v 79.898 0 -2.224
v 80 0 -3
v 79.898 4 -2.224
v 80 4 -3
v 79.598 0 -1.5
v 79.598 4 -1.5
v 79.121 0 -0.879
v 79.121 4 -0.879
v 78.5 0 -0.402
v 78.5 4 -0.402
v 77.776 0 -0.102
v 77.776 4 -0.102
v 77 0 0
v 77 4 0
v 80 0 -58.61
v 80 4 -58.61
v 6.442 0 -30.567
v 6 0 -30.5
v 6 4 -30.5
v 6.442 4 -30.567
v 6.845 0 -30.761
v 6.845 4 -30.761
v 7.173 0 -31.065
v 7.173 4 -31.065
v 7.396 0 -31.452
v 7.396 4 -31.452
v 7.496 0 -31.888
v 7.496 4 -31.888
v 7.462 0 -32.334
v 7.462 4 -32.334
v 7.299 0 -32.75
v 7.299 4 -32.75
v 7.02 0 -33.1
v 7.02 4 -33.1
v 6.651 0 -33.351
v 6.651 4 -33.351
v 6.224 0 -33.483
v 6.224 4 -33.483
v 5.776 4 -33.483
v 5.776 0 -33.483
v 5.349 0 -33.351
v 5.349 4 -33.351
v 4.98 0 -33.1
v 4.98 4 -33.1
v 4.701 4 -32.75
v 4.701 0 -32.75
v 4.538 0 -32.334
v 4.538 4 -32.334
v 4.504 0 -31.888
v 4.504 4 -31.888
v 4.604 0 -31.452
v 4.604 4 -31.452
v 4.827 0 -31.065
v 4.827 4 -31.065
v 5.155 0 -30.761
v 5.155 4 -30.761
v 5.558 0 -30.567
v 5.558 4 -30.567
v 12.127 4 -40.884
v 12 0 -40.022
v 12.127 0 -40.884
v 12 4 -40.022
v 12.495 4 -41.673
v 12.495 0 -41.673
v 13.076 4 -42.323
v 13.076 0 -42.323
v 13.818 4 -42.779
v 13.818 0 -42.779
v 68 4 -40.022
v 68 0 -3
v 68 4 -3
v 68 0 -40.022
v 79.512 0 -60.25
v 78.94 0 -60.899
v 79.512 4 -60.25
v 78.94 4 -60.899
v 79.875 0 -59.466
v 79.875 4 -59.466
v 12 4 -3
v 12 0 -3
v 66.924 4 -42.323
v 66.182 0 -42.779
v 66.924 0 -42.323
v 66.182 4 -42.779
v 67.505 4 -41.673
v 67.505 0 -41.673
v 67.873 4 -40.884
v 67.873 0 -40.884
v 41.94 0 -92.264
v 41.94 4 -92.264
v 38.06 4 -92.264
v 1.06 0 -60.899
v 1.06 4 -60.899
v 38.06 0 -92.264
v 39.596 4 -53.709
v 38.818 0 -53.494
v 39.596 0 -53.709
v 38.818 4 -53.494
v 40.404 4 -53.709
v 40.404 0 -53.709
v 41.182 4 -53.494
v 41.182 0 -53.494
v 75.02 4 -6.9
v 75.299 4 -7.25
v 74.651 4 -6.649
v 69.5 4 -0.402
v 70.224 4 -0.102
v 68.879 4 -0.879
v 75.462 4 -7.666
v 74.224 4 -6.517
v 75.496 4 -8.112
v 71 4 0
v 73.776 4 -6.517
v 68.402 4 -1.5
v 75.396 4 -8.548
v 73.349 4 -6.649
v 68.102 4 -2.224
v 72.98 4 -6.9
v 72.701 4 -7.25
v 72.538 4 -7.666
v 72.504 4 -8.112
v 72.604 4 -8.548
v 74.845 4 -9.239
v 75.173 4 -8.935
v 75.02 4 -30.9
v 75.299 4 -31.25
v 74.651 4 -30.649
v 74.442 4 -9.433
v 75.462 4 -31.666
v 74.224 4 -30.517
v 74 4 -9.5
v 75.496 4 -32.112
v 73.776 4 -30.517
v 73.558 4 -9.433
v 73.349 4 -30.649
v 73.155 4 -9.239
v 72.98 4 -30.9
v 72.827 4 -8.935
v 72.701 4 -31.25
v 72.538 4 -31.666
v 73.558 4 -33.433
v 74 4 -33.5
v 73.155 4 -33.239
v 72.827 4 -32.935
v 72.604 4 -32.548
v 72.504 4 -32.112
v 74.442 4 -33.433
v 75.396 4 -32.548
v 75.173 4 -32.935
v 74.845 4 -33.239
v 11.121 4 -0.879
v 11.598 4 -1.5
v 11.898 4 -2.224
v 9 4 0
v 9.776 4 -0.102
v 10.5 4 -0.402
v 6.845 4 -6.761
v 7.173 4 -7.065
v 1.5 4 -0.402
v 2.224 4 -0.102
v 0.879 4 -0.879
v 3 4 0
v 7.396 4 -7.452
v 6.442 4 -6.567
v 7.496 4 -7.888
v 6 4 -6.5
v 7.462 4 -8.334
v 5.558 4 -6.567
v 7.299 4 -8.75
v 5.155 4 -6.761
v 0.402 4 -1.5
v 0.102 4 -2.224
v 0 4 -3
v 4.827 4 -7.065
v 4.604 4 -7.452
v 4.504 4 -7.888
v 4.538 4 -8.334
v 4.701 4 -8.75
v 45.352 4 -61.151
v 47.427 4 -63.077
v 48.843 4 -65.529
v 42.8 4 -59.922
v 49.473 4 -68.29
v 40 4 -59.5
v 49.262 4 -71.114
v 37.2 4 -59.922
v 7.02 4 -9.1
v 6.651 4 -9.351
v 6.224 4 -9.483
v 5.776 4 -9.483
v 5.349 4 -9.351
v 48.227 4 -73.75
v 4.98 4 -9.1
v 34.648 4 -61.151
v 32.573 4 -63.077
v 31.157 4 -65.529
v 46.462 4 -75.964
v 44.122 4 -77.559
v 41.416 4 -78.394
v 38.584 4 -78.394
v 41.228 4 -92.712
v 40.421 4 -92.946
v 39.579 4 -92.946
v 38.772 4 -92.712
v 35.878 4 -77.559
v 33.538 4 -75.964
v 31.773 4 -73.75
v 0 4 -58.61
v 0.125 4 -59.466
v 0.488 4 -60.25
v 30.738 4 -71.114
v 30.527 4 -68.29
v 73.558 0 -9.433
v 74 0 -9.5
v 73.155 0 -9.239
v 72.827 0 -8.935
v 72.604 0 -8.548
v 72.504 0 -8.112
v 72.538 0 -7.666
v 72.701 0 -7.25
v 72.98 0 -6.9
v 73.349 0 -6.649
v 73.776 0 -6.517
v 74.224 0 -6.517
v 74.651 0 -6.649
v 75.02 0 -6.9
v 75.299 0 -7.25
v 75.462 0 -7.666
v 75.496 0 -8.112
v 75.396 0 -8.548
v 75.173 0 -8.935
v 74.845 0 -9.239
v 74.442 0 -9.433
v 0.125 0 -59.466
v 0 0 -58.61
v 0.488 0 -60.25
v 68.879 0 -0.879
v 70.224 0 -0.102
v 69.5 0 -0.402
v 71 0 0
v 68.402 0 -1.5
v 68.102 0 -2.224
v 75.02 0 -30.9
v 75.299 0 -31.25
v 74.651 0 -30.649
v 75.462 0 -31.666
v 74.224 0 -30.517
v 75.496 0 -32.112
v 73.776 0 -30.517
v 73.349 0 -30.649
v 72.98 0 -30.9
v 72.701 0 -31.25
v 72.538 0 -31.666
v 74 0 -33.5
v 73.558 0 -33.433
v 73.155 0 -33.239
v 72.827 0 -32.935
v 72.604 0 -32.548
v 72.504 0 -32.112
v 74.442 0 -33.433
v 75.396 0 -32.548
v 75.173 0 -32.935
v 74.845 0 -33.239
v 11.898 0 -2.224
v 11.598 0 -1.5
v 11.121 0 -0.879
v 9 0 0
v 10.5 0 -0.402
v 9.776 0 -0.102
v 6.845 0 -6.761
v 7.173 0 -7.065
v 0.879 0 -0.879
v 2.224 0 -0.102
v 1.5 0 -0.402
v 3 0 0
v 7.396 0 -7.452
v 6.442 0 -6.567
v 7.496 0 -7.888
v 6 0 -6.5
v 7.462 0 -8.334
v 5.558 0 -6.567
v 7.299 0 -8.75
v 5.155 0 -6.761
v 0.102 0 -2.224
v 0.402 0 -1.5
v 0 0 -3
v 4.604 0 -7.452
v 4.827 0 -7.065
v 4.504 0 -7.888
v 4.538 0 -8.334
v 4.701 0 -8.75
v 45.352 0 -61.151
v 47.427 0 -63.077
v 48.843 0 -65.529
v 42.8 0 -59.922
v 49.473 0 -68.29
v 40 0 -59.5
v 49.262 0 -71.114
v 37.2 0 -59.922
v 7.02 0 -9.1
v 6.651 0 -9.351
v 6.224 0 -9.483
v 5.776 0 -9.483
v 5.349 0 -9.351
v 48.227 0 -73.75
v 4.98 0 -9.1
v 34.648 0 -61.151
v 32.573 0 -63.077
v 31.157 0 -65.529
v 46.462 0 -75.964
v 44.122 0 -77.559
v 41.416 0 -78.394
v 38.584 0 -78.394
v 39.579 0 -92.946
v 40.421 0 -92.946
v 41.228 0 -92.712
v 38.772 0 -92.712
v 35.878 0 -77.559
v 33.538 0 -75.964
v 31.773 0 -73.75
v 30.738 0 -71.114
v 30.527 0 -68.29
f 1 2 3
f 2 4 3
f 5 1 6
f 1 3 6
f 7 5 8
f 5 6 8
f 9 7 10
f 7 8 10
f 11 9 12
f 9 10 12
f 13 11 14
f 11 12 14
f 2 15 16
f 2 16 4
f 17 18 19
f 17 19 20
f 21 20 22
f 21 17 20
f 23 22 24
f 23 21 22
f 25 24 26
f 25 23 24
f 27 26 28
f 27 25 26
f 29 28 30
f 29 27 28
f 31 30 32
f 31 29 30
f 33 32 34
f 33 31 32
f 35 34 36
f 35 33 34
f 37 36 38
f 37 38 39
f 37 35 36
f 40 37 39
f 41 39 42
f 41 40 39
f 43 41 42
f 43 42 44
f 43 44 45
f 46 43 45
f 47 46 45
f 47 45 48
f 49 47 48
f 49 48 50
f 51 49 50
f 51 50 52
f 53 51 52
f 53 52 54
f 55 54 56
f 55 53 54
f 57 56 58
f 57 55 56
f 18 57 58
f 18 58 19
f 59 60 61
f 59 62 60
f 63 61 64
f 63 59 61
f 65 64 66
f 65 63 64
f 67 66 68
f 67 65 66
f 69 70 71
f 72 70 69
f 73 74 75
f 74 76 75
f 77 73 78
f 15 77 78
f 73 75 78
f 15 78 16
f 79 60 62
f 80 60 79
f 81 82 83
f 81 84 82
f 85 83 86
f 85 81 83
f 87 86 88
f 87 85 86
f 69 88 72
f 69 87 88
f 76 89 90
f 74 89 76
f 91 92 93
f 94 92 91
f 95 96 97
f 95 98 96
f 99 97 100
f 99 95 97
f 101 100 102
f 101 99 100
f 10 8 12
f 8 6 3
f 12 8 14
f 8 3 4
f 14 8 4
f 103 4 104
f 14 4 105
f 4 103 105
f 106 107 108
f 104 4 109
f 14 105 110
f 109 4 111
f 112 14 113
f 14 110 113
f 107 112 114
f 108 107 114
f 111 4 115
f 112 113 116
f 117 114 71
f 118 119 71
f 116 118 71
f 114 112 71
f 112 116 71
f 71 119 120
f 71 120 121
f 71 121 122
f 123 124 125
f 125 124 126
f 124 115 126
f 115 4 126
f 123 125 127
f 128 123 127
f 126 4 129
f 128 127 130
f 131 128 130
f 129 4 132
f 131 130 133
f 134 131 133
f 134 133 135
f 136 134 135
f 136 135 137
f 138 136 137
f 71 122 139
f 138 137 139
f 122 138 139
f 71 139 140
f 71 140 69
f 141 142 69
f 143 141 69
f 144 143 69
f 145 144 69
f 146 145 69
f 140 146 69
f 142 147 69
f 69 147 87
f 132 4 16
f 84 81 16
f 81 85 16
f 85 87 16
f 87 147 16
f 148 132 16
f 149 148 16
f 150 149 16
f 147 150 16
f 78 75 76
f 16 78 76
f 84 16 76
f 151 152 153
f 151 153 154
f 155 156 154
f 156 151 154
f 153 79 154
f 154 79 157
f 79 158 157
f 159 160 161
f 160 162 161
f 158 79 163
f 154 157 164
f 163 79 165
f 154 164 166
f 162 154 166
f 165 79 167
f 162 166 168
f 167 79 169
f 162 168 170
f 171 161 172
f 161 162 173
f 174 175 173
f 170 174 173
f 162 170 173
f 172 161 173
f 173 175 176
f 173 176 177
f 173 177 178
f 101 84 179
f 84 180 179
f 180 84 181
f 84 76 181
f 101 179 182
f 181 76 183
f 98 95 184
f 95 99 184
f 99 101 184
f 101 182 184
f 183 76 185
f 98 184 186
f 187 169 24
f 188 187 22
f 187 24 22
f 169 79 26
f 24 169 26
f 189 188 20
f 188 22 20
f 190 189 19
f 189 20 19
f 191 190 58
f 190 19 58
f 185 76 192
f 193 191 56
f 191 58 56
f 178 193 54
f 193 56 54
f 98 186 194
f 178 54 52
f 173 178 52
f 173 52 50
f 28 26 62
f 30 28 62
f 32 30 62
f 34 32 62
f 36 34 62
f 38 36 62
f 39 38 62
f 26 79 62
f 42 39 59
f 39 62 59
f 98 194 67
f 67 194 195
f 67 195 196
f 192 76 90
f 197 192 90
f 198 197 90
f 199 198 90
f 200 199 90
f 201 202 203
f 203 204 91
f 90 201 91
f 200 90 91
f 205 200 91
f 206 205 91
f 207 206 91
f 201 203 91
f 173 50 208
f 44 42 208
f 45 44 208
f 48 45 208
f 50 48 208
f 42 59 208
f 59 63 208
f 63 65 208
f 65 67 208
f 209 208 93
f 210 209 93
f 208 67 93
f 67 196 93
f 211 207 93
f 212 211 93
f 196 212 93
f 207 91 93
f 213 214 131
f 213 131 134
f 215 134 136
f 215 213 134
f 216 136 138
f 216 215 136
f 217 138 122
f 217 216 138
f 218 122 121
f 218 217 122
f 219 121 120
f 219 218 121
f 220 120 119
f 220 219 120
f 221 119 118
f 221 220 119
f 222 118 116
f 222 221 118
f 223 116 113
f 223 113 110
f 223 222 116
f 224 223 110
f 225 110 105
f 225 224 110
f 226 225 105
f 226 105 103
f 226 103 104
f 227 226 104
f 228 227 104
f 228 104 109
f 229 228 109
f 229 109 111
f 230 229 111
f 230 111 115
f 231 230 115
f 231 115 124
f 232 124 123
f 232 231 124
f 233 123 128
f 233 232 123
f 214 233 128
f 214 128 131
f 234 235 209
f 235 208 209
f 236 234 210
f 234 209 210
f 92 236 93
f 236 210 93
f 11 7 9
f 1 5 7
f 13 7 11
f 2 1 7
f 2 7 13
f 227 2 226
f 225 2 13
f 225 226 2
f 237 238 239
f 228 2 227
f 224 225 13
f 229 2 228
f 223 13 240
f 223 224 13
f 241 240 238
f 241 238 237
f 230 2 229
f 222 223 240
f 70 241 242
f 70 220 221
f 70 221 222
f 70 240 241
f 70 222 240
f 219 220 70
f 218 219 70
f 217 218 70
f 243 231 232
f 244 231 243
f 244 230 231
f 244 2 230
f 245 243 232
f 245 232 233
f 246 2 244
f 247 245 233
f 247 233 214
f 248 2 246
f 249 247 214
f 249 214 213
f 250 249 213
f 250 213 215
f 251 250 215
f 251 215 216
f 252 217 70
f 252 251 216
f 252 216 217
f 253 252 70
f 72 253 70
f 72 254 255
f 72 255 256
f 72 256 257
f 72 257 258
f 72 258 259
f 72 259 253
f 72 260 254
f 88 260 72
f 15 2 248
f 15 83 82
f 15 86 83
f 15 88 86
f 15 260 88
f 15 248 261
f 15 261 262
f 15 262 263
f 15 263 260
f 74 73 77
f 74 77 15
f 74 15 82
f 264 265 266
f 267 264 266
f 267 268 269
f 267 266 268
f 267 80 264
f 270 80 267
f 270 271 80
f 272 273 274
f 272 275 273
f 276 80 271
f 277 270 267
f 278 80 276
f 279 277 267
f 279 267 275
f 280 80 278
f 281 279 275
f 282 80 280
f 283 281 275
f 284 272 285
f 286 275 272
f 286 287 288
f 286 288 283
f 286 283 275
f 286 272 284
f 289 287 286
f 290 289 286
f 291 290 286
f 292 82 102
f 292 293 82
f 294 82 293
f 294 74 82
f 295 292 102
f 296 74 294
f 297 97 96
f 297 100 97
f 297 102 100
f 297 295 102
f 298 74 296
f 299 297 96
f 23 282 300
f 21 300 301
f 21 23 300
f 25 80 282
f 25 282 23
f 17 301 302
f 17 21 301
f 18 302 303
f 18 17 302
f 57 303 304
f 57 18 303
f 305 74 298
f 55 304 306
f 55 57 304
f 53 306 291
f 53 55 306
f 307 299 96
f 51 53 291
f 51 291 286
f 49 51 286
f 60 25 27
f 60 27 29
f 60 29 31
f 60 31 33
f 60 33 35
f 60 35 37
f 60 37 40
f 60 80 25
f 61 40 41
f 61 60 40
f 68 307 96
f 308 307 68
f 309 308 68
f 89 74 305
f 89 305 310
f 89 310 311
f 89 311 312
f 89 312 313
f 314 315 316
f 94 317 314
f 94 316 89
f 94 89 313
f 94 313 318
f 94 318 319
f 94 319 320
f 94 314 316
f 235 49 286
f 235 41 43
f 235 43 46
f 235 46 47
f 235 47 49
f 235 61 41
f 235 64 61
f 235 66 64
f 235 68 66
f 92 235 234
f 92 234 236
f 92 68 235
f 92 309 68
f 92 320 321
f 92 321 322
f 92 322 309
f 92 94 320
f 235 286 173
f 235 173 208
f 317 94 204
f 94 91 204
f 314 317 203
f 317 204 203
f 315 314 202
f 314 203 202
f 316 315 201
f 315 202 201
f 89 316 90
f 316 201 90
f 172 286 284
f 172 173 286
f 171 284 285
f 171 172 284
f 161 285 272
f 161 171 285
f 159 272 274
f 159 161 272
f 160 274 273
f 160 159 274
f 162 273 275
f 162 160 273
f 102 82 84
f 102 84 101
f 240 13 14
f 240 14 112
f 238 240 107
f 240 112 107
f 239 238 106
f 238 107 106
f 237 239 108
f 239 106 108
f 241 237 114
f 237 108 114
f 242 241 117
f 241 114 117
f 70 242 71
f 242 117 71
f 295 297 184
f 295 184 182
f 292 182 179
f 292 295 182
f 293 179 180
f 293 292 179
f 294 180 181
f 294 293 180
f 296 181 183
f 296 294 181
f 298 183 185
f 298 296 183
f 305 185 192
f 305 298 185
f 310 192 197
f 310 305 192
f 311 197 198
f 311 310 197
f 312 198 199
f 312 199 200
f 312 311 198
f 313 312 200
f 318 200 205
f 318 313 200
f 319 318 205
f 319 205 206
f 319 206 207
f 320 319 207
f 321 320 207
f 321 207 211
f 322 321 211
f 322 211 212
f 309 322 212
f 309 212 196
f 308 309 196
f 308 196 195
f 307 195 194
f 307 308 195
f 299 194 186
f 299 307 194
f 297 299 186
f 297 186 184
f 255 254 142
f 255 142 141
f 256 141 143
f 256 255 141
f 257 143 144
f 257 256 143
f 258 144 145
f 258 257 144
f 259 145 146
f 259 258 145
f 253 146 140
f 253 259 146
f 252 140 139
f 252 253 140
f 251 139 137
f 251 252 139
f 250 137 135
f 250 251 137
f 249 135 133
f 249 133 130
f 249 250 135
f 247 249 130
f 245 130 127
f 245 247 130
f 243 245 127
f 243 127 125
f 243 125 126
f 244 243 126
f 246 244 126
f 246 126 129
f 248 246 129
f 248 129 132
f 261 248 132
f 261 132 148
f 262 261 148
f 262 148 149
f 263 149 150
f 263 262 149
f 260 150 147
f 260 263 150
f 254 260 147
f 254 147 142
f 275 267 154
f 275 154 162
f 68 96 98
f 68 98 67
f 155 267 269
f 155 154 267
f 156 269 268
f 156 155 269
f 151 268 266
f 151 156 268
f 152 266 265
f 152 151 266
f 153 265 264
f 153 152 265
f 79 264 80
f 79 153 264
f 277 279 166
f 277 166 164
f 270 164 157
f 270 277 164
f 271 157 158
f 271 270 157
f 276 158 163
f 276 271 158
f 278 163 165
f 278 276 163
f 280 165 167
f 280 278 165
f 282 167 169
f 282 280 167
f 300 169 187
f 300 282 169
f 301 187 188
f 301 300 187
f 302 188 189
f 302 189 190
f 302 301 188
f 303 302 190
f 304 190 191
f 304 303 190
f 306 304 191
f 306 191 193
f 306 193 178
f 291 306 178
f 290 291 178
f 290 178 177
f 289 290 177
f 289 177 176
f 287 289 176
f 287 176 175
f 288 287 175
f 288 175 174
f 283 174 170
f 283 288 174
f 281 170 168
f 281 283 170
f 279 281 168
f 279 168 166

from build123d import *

# Parameters (mm, degrees)
SKETCH_2_R      = 1.5
SKETCH_2_R_2    = 9.5
EXTRUDE_1_DEPTH = 4
FILLET_1_R      = 3


with BuildPart() as part:
    # 草图2 → 凸台-拉伸1 (new body)
    with BuildSketch(Plane(origin=(0, 0, 0), x_dir=(1, 0, 0), z_dir=(0, 1, 0))):
        Polygon((0, 0), (0, 60), (40, 93.908128514), (80, 60), (80, 0), (68, 0), (68, 42), (40, 54), (12, 42), (12, 0), align=None)
        with Locations(Location((6, 32, 0), (0, 0, 270))):
            Circle(SKETCH_2_R, mode=Mode.SUBTRACT)
        with Locations(Location((6, 8, 0), (0, 0, 270))):
            Circle(SKETCH_2_R, mode=Mode.SUBTRACT)
        with Locations(Location((40, 69, 0), (0, 0, 270))):
            Circle(SKETCH_2_R_2, mode=Mode.SUBTRACT)
        with Locations(Location((74, 8, 0), (0, 0, 90))):
            Circle(SKETCH_2_R, mode=Mode.SUBTRACT)
        with Locations(Location((74, 32, 0), (0, 0, 90))):
            Circle(SKETCH_2_R, mode=Mode.SUBTRACT)
    extrude(amount=EXTRUDE_1_DEPTH)

    # 圆角1
    fillet_1_edges = [part.edges().sort_by_distance(p)[0] for p in [
        (0, 2, 0),
        (0, 2, -60),
        (40, 2, -93.908128514),
        (80, 2, -60),
        (80, 2, 0),
        (68, 2, 0),
        (68, 2, -42),
        (40, 2, -54),
        (12, 2, -42),
        (12, 2, 0),
    ]]
    fillet(fillet_1_edges, radius=FILLET_1_R)


solid = part.part
